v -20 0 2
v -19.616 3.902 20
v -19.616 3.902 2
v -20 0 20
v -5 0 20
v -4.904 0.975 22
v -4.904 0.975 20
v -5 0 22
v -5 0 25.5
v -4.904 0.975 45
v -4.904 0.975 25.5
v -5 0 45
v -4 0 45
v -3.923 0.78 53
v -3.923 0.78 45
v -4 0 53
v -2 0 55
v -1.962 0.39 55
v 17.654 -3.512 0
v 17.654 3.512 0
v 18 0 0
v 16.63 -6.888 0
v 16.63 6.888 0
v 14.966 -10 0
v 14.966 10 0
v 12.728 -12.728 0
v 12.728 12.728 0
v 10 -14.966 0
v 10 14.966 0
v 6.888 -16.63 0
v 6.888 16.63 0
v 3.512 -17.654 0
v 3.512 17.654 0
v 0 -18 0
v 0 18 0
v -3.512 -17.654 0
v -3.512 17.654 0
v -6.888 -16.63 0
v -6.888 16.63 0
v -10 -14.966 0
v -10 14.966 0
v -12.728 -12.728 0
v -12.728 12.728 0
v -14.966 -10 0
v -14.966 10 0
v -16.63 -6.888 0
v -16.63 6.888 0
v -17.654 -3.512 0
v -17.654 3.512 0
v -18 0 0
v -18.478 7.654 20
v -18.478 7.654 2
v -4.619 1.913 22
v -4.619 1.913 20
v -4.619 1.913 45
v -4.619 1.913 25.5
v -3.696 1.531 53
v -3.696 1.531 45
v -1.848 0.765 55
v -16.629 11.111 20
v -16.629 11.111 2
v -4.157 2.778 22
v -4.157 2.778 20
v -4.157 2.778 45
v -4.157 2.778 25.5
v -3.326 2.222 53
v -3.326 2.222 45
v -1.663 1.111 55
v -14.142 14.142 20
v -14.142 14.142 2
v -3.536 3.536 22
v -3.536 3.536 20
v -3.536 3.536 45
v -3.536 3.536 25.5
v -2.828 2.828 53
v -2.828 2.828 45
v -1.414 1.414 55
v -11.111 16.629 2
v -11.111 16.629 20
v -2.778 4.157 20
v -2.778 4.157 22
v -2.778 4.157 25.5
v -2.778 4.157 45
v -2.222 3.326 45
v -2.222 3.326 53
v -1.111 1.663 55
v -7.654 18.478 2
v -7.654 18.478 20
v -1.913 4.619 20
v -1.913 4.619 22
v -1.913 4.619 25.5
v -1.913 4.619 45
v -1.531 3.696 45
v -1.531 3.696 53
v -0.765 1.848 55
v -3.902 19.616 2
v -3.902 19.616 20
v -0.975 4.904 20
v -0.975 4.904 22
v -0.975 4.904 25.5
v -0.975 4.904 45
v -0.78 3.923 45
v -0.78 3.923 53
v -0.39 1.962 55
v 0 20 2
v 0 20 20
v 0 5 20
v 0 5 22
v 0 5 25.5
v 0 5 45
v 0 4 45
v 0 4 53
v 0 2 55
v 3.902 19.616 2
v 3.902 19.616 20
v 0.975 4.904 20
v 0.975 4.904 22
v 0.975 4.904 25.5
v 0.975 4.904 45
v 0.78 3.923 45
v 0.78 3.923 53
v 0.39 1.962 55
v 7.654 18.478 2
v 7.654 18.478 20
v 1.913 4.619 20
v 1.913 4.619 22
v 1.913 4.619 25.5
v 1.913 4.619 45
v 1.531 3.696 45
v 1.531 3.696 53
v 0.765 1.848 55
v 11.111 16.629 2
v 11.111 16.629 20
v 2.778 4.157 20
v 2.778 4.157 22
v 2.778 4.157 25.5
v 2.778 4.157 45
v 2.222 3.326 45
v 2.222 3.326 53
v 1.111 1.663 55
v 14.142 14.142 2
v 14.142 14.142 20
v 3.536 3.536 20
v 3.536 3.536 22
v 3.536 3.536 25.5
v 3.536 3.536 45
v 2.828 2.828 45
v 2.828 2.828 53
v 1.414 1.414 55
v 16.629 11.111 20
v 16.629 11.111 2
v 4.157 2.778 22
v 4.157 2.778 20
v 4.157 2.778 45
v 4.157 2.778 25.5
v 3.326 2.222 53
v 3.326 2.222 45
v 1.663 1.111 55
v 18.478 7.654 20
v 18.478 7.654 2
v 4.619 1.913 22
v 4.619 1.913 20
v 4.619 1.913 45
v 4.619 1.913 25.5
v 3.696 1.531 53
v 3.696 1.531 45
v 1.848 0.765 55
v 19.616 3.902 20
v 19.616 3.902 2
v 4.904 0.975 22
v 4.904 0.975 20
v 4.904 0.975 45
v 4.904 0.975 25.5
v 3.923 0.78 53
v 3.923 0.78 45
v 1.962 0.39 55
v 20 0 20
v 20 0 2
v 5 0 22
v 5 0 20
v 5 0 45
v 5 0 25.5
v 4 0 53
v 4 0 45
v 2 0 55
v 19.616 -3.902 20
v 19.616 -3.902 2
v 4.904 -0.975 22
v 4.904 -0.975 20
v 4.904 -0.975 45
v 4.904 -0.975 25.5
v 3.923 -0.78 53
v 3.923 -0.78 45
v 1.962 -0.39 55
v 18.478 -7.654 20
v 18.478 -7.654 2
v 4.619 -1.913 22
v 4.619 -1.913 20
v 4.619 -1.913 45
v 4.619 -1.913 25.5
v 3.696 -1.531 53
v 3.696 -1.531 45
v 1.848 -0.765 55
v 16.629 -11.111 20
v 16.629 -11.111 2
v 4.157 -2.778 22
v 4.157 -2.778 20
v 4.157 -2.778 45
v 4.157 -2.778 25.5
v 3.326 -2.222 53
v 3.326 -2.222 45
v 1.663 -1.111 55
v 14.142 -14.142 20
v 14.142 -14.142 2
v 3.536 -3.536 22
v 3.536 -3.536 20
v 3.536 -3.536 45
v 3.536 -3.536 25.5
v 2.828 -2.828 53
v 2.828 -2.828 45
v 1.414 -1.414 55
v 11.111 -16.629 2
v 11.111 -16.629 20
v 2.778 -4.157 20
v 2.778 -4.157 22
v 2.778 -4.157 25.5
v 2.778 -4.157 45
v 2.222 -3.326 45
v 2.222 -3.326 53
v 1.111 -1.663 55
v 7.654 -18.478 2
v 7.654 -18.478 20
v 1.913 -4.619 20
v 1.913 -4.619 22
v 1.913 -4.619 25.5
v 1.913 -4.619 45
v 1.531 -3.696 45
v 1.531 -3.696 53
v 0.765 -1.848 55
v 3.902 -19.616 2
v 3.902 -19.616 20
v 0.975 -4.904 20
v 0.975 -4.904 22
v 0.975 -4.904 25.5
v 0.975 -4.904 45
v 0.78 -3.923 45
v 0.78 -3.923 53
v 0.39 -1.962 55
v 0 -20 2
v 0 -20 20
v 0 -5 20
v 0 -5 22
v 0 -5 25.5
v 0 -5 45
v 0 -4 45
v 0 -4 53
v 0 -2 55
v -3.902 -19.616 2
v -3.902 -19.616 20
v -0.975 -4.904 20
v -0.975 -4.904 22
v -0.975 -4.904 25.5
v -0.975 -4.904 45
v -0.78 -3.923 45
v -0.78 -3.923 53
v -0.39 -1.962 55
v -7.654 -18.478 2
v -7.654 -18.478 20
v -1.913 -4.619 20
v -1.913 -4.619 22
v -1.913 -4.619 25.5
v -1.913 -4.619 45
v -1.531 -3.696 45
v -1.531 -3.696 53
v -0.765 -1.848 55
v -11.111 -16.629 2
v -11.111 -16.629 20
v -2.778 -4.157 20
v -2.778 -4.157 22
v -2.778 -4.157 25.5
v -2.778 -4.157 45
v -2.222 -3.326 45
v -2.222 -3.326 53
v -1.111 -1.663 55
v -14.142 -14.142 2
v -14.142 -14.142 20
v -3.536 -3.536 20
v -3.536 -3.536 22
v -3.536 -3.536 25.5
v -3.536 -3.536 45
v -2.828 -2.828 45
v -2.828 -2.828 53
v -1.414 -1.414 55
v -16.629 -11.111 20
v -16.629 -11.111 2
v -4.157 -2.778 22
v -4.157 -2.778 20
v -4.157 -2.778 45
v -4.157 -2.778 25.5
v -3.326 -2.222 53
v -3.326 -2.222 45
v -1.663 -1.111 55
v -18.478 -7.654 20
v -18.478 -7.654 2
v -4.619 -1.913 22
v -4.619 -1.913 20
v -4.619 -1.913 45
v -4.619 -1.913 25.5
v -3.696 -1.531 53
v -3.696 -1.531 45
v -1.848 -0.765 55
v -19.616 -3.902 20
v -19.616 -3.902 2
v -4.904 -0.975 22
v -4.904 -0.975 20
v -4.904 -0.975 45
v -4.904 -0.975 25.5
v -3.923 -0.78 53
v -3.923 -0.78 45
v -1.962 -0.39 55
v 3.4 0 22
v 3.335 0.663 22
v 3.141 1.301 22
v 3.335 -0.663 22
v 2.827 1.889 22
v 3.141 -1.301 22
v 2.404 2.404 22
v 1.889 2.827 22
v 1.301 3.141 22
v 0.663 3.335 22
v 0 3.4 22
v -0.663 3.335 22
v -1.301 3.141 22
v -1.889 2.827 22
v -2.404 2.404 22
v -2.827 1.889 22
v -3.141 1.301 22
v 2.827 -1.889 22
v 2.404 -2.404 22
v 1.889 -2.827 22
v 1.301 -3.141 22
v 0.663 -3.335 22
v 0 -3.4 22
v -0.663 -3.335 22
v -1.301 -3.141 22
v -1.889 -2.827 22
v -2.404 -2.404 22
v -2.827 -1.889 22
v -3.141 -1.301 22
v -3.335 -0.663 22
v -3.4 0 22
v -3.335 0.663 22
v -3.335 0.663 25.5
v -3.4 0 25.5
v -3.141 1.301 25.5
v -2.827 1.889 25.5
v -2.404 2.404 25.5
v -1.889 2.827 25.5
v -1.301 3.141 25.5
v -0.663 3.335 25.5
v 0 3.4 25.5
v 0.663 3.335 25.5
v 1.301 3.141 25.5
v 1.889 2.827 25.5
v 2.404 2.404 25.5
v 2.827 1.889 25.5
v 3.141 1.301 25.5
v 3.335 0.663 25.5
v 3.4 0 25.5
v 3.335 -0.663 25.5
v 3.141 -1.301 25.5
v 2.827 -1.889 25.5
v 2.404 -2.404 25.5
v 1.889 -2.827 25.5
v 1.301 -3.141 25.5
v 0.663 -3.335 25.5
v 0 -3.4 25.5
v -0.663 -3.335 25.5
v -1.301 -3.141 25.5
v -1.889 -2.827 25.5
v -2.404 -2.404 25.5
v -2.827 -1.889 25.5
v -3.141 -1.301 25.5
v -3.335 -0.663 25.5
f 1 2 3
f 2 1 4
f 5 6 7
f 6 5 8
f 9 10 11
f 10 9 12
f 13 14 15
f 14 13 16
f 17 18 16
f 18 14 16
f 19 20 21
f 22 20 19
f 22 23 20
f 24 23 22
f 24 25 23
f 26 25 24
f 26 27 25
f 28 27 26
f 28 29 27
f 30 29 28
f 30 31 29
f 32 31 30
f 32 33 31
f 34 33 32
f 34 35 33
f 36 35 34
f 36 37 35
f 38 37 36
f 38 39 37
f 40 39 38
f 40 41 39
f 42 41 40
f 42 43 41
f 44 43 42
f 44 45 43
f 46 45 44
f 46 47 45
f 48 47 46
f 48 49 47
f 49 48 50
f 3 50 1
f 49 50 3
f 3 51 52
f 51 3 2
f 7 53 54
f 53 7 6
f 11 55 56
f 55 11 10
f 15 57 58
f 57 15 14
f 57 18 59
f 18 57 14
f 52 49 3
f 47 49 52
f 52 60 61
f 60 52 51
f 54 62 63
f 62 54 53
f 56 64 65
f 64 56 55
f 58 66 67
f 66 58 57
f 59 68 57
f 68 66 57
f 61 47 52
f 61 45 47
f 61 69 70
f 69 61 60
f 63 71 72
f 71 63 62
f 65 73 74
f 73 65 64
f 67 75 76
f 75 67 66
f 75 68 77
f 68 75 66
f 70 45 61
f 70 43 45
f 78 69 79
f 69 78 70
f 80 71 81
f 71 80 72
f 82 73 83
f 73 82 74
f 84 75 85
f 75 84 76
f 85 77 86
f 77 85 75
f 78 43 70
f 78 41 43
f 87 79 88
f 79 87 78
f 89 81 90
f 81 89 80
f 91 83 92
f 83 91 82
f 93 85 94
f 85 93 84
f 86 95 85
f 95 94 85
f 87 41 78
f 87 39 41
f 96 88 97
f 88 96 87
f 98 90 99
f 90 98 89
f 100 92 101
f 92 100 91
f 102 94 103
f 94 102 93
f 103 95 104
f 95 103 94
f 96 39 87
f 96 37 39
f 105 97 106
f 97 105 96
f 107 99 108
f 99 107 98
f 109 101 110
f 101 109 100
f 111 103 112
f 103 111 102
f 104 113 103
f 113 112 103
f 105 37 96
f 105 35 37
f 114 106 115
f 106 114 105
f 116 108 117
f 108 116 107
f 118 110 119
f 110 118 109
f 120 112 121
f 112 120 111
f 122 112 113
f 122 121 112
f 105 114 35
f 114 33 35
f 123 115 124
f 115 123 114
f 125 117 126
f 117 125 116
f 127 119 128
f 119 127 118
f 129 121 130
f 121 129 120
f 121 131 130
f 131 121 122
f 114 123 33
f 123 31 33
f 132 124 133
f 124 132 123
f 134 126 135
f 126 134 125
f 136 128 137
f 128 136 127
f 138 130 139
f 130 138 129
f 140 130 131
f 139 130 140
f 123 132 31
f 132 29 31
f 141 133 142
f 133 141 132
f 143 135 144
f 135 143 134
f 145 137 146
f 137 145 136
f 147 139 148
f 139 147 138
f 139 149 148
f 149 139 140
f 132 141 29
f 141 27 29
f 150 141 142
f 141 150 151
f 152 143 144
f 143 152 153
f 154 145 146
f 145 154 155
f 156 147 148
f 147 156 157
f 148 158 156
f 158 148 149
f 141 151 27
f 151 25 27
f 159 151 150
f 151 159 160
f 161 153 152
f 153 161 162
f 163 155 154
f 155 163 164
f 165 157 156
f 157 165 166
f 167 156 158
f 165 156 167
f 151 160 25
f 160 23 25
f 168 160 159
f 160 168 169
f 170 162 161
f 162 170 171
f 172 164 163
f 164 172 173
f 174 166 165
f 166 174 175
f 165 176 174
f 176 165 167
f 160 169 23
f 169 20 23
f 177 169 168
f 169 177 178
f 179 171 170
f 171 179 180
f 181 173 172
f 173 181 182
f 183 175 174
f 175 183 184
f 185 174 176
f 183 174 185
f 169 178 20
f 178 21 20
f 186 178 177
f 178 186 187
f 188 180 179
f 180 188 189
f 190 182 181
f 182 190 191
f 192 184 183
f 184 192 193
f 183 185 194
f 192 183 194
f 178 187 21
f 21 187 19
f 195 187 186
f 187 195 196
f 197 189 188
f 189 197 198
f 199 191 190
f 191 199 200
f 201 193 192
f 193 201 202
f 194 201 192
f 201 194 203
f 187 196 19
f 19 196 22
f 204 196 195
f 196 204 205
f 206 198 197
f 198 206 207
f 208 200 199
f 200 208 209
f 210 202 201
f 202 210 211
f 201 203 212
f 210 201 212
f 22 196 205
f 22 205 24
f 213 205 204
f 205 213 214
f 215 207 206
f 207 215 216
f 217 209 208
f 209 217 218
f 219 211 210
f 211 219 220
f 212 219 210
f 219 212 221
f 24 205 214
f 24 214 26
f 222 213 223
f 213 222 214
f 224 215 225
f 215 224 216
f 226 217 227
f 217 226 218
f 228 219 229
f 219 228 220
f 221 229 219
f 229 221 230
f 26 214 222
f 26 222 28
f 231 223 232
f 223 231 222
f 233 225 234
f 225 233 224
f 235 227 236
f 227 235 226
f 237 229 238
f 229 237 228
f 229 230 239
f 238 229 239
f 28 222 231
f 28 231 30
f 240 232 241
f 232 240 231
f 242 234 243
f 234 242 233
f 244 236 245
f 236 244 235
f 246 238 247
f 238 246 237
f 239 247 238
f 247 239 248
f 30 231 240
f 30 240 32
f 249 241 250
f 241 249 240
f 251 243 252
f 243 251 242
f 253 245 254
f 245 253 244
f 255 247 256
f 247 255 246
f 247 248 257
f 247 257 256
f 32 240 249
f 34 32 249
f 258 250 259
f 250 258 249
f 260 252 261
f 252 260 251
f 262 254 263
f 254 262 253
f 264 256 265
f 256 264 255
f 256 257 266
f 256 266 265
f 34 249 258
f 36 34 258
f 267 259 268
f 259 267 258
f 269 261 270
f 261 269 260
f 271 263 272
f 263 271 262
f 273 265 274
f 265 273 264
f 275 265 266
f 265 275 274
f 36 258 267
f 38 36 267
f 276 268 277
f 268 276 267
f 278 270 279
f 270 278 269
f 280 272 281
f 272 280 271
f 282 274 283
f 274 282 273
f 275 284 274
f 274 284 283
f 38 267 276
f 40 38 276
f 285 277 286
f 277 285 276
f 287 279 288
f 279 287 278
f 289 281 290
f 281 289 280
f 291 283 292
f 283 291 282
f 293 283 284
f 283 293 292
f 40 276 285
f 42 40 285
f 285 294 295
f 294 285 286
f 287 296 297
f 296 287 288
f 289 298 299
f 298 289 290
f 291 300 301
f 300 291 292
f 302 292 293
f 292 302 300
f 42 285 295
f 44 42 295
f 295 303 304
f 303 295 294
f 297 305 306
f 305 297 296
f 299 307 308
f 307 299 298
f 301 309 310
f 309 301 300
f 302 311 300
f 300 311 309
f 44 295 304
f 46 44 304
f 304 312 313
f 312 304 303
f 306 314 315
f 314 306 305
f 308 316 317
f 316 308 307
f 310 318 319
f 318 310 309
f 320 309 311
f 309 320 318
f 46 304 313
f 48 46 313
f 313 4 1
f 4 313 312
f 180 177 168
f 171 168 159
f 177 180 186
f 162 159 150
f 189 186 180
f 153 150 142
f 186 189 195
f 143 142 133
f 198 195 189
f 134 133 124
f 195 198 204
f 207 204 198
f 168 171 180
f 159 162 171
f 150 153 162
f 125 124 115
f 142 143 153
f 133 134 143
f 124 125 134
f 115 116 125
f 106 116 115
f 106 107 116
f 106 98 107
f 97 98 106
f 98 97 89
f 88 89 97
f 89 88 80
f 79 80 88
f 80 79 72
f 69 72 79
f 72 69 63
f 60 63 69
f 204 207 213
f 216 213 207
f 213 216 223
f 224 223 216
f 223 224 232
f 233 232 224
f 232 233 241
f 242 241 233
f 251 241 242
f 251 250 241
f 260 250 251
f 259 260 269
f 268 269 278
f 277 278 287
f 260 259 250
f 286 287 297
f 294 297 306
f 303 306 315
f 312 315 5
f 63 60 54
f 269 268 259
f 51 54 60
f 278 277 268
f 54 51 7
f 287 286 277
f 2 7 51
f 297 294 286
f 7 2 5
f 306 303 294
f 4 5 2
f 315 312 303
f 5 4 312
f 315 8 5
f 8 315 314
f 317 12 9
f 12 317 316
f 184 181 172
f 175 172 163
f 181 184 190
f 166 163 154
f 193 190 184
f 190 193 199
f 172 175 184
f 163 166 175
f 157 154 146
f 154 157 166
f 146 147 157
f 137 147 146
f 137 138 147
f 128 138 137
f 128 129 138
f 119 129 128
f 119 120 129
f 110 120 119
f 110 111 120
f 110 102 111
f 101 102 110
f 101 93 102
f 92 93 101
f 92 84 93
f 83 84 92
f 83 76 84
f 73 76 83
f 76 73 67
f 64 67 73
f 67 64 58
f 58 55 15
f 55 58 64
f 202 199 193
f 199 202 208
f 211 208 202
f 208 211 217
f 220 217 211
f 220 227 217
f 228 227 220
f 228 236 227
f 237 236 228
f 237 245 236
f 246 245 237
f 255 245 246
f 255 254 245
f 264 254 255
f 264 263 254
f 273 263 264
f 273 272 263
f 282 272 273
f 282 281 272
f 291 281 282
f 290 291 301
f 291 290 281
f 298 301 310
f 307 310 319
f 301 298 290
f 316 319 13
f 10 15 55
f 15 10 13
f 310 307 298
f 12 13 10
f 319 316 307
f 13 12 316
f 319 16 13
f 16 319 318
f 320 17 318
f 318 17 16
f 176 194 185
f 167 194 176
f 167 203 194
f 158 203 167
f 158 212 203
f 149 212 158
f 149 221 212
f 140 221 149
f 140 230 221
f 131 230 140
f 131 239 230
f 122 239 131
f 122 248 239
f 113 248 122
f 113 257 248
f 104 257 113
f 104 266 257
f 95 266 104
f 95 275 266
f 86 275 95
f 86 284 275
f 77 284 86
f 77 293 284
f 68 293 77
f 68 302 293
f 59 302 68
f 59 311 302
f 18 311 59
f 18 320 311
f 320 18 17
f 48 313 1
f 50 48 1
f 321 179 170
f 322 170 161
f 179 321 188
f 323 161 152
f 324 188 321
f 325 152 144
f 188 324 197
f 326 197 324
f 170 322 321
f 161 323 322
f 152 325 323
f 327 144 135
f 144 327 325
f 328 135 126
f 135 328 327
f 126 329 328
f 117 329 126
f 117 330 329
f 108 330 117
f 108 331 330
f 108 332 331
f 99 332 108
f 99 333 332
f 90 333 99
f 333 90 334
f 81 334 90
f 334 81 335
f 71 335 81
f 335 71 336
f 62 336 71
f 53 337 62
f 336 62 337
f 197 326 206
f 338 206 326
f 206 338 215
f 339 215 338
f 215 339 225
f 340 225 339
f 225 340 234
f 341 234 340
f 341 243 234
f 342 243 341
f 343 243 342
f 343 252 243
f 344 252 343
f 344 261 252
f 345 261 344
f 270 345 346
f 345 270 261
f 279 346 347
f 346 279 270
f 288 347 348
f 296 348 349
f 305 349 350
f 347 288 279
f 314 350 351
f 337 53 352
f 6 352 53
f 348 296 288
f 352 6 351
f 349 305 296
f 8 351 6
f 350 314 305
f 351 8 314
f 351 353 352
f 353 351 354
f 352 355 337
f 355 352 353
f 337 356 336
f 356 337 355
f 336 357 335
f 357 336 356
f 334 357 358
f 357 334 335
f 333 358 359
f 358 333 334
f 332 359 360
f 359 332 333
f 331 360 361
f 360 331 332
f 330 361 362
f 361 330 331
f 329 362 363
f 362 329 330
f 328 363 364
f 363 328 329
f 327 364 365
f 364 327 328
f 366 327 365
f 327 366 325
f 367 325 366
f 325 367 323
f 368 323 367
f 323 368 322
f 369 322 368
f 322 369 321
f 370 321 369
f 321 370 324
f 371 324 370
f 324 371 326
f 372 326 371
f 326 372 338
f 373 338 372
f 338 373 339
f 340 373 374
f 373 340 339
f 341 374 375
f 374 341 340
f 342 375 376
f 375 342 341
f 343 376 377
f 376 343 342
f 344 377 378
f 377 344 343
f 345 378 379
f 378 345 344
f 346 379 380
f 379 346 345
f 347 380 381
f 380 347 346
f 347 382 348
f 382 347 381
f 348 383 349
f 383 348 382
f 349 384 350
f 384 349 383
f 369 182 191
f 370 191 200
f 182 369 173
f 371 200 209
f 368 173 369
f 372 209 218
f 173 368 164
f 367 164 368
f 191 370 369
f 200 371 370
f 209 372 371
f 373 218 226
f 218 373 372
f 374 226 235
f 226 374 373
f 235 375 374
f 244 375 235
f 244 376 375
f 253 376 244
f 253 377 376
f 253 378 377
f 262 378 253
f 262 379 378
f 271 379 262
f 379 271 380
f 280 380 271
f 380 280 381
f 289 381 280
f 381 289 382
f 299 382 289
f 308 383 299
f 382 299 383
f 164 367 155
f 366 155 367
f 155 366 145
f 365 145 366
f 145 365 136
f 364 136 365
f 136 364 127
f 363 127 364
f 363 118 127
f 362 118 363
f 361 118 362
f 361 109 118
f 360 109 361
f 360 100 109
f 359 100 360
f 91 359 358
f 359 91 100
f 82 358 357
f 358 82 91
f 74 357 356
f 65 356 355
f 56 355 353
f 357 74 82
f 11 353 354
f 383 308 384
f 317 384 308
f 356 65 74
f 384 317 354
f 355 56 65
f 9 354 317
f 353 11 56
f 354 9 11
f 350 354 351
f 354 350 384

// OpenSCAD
$fn = 32;

// ----------------------------------------------------------------------
// Stepped shaft: diameters 40, 10, 8 mm, 55 mm long
// ----------------------------------------------------------------------

// --- parameters (mm) ---
d1 = 40;                  // step 1 diameter
len1 = 20;                // step 1 length
d2 = 10;                  // step 2 diameter
len2 = 25;                // step 2 length
d3 = 8;                   // step 3 diameter
len3 = 10;                // step 3 length
total = 55;               // overall length
chamfer = 2;              // end chamfer
groove_r = 5;             // groove radius
groove_z = 22;            // groove position from the end
groove_w = 3.5;           // groove width
groove_d = 1.6;           // groove depth
key_w = 4;                // keyway width
key_d = 2;                // keyway depth
key_len = 14;             // keyway length
key_z = 38;               // keyway start along the shaft

/* closed turning profile: x is the radius, y is the length */
profile = [[0, 0], [20 - chamfer, 0], [20, chamfer], [20, 20], [5, 20], [5, 45], [4, 45], [4, 53], [2, 55], [0, 55]];

difference() {
  rotate_extrude() polygon(profile);
  /* circlip groove just behind the shoulder */
  rotate_extrude() translate([groove_r - groove_d, groove_z]) square([groove_d + 1, groove_w]);
  /* keyway milled into the top of the largest step */
  translate([d1 / 2 - key_d, -key_w / 2, key_z]) cube([key_d + 1, key_w, key_len]);
}
